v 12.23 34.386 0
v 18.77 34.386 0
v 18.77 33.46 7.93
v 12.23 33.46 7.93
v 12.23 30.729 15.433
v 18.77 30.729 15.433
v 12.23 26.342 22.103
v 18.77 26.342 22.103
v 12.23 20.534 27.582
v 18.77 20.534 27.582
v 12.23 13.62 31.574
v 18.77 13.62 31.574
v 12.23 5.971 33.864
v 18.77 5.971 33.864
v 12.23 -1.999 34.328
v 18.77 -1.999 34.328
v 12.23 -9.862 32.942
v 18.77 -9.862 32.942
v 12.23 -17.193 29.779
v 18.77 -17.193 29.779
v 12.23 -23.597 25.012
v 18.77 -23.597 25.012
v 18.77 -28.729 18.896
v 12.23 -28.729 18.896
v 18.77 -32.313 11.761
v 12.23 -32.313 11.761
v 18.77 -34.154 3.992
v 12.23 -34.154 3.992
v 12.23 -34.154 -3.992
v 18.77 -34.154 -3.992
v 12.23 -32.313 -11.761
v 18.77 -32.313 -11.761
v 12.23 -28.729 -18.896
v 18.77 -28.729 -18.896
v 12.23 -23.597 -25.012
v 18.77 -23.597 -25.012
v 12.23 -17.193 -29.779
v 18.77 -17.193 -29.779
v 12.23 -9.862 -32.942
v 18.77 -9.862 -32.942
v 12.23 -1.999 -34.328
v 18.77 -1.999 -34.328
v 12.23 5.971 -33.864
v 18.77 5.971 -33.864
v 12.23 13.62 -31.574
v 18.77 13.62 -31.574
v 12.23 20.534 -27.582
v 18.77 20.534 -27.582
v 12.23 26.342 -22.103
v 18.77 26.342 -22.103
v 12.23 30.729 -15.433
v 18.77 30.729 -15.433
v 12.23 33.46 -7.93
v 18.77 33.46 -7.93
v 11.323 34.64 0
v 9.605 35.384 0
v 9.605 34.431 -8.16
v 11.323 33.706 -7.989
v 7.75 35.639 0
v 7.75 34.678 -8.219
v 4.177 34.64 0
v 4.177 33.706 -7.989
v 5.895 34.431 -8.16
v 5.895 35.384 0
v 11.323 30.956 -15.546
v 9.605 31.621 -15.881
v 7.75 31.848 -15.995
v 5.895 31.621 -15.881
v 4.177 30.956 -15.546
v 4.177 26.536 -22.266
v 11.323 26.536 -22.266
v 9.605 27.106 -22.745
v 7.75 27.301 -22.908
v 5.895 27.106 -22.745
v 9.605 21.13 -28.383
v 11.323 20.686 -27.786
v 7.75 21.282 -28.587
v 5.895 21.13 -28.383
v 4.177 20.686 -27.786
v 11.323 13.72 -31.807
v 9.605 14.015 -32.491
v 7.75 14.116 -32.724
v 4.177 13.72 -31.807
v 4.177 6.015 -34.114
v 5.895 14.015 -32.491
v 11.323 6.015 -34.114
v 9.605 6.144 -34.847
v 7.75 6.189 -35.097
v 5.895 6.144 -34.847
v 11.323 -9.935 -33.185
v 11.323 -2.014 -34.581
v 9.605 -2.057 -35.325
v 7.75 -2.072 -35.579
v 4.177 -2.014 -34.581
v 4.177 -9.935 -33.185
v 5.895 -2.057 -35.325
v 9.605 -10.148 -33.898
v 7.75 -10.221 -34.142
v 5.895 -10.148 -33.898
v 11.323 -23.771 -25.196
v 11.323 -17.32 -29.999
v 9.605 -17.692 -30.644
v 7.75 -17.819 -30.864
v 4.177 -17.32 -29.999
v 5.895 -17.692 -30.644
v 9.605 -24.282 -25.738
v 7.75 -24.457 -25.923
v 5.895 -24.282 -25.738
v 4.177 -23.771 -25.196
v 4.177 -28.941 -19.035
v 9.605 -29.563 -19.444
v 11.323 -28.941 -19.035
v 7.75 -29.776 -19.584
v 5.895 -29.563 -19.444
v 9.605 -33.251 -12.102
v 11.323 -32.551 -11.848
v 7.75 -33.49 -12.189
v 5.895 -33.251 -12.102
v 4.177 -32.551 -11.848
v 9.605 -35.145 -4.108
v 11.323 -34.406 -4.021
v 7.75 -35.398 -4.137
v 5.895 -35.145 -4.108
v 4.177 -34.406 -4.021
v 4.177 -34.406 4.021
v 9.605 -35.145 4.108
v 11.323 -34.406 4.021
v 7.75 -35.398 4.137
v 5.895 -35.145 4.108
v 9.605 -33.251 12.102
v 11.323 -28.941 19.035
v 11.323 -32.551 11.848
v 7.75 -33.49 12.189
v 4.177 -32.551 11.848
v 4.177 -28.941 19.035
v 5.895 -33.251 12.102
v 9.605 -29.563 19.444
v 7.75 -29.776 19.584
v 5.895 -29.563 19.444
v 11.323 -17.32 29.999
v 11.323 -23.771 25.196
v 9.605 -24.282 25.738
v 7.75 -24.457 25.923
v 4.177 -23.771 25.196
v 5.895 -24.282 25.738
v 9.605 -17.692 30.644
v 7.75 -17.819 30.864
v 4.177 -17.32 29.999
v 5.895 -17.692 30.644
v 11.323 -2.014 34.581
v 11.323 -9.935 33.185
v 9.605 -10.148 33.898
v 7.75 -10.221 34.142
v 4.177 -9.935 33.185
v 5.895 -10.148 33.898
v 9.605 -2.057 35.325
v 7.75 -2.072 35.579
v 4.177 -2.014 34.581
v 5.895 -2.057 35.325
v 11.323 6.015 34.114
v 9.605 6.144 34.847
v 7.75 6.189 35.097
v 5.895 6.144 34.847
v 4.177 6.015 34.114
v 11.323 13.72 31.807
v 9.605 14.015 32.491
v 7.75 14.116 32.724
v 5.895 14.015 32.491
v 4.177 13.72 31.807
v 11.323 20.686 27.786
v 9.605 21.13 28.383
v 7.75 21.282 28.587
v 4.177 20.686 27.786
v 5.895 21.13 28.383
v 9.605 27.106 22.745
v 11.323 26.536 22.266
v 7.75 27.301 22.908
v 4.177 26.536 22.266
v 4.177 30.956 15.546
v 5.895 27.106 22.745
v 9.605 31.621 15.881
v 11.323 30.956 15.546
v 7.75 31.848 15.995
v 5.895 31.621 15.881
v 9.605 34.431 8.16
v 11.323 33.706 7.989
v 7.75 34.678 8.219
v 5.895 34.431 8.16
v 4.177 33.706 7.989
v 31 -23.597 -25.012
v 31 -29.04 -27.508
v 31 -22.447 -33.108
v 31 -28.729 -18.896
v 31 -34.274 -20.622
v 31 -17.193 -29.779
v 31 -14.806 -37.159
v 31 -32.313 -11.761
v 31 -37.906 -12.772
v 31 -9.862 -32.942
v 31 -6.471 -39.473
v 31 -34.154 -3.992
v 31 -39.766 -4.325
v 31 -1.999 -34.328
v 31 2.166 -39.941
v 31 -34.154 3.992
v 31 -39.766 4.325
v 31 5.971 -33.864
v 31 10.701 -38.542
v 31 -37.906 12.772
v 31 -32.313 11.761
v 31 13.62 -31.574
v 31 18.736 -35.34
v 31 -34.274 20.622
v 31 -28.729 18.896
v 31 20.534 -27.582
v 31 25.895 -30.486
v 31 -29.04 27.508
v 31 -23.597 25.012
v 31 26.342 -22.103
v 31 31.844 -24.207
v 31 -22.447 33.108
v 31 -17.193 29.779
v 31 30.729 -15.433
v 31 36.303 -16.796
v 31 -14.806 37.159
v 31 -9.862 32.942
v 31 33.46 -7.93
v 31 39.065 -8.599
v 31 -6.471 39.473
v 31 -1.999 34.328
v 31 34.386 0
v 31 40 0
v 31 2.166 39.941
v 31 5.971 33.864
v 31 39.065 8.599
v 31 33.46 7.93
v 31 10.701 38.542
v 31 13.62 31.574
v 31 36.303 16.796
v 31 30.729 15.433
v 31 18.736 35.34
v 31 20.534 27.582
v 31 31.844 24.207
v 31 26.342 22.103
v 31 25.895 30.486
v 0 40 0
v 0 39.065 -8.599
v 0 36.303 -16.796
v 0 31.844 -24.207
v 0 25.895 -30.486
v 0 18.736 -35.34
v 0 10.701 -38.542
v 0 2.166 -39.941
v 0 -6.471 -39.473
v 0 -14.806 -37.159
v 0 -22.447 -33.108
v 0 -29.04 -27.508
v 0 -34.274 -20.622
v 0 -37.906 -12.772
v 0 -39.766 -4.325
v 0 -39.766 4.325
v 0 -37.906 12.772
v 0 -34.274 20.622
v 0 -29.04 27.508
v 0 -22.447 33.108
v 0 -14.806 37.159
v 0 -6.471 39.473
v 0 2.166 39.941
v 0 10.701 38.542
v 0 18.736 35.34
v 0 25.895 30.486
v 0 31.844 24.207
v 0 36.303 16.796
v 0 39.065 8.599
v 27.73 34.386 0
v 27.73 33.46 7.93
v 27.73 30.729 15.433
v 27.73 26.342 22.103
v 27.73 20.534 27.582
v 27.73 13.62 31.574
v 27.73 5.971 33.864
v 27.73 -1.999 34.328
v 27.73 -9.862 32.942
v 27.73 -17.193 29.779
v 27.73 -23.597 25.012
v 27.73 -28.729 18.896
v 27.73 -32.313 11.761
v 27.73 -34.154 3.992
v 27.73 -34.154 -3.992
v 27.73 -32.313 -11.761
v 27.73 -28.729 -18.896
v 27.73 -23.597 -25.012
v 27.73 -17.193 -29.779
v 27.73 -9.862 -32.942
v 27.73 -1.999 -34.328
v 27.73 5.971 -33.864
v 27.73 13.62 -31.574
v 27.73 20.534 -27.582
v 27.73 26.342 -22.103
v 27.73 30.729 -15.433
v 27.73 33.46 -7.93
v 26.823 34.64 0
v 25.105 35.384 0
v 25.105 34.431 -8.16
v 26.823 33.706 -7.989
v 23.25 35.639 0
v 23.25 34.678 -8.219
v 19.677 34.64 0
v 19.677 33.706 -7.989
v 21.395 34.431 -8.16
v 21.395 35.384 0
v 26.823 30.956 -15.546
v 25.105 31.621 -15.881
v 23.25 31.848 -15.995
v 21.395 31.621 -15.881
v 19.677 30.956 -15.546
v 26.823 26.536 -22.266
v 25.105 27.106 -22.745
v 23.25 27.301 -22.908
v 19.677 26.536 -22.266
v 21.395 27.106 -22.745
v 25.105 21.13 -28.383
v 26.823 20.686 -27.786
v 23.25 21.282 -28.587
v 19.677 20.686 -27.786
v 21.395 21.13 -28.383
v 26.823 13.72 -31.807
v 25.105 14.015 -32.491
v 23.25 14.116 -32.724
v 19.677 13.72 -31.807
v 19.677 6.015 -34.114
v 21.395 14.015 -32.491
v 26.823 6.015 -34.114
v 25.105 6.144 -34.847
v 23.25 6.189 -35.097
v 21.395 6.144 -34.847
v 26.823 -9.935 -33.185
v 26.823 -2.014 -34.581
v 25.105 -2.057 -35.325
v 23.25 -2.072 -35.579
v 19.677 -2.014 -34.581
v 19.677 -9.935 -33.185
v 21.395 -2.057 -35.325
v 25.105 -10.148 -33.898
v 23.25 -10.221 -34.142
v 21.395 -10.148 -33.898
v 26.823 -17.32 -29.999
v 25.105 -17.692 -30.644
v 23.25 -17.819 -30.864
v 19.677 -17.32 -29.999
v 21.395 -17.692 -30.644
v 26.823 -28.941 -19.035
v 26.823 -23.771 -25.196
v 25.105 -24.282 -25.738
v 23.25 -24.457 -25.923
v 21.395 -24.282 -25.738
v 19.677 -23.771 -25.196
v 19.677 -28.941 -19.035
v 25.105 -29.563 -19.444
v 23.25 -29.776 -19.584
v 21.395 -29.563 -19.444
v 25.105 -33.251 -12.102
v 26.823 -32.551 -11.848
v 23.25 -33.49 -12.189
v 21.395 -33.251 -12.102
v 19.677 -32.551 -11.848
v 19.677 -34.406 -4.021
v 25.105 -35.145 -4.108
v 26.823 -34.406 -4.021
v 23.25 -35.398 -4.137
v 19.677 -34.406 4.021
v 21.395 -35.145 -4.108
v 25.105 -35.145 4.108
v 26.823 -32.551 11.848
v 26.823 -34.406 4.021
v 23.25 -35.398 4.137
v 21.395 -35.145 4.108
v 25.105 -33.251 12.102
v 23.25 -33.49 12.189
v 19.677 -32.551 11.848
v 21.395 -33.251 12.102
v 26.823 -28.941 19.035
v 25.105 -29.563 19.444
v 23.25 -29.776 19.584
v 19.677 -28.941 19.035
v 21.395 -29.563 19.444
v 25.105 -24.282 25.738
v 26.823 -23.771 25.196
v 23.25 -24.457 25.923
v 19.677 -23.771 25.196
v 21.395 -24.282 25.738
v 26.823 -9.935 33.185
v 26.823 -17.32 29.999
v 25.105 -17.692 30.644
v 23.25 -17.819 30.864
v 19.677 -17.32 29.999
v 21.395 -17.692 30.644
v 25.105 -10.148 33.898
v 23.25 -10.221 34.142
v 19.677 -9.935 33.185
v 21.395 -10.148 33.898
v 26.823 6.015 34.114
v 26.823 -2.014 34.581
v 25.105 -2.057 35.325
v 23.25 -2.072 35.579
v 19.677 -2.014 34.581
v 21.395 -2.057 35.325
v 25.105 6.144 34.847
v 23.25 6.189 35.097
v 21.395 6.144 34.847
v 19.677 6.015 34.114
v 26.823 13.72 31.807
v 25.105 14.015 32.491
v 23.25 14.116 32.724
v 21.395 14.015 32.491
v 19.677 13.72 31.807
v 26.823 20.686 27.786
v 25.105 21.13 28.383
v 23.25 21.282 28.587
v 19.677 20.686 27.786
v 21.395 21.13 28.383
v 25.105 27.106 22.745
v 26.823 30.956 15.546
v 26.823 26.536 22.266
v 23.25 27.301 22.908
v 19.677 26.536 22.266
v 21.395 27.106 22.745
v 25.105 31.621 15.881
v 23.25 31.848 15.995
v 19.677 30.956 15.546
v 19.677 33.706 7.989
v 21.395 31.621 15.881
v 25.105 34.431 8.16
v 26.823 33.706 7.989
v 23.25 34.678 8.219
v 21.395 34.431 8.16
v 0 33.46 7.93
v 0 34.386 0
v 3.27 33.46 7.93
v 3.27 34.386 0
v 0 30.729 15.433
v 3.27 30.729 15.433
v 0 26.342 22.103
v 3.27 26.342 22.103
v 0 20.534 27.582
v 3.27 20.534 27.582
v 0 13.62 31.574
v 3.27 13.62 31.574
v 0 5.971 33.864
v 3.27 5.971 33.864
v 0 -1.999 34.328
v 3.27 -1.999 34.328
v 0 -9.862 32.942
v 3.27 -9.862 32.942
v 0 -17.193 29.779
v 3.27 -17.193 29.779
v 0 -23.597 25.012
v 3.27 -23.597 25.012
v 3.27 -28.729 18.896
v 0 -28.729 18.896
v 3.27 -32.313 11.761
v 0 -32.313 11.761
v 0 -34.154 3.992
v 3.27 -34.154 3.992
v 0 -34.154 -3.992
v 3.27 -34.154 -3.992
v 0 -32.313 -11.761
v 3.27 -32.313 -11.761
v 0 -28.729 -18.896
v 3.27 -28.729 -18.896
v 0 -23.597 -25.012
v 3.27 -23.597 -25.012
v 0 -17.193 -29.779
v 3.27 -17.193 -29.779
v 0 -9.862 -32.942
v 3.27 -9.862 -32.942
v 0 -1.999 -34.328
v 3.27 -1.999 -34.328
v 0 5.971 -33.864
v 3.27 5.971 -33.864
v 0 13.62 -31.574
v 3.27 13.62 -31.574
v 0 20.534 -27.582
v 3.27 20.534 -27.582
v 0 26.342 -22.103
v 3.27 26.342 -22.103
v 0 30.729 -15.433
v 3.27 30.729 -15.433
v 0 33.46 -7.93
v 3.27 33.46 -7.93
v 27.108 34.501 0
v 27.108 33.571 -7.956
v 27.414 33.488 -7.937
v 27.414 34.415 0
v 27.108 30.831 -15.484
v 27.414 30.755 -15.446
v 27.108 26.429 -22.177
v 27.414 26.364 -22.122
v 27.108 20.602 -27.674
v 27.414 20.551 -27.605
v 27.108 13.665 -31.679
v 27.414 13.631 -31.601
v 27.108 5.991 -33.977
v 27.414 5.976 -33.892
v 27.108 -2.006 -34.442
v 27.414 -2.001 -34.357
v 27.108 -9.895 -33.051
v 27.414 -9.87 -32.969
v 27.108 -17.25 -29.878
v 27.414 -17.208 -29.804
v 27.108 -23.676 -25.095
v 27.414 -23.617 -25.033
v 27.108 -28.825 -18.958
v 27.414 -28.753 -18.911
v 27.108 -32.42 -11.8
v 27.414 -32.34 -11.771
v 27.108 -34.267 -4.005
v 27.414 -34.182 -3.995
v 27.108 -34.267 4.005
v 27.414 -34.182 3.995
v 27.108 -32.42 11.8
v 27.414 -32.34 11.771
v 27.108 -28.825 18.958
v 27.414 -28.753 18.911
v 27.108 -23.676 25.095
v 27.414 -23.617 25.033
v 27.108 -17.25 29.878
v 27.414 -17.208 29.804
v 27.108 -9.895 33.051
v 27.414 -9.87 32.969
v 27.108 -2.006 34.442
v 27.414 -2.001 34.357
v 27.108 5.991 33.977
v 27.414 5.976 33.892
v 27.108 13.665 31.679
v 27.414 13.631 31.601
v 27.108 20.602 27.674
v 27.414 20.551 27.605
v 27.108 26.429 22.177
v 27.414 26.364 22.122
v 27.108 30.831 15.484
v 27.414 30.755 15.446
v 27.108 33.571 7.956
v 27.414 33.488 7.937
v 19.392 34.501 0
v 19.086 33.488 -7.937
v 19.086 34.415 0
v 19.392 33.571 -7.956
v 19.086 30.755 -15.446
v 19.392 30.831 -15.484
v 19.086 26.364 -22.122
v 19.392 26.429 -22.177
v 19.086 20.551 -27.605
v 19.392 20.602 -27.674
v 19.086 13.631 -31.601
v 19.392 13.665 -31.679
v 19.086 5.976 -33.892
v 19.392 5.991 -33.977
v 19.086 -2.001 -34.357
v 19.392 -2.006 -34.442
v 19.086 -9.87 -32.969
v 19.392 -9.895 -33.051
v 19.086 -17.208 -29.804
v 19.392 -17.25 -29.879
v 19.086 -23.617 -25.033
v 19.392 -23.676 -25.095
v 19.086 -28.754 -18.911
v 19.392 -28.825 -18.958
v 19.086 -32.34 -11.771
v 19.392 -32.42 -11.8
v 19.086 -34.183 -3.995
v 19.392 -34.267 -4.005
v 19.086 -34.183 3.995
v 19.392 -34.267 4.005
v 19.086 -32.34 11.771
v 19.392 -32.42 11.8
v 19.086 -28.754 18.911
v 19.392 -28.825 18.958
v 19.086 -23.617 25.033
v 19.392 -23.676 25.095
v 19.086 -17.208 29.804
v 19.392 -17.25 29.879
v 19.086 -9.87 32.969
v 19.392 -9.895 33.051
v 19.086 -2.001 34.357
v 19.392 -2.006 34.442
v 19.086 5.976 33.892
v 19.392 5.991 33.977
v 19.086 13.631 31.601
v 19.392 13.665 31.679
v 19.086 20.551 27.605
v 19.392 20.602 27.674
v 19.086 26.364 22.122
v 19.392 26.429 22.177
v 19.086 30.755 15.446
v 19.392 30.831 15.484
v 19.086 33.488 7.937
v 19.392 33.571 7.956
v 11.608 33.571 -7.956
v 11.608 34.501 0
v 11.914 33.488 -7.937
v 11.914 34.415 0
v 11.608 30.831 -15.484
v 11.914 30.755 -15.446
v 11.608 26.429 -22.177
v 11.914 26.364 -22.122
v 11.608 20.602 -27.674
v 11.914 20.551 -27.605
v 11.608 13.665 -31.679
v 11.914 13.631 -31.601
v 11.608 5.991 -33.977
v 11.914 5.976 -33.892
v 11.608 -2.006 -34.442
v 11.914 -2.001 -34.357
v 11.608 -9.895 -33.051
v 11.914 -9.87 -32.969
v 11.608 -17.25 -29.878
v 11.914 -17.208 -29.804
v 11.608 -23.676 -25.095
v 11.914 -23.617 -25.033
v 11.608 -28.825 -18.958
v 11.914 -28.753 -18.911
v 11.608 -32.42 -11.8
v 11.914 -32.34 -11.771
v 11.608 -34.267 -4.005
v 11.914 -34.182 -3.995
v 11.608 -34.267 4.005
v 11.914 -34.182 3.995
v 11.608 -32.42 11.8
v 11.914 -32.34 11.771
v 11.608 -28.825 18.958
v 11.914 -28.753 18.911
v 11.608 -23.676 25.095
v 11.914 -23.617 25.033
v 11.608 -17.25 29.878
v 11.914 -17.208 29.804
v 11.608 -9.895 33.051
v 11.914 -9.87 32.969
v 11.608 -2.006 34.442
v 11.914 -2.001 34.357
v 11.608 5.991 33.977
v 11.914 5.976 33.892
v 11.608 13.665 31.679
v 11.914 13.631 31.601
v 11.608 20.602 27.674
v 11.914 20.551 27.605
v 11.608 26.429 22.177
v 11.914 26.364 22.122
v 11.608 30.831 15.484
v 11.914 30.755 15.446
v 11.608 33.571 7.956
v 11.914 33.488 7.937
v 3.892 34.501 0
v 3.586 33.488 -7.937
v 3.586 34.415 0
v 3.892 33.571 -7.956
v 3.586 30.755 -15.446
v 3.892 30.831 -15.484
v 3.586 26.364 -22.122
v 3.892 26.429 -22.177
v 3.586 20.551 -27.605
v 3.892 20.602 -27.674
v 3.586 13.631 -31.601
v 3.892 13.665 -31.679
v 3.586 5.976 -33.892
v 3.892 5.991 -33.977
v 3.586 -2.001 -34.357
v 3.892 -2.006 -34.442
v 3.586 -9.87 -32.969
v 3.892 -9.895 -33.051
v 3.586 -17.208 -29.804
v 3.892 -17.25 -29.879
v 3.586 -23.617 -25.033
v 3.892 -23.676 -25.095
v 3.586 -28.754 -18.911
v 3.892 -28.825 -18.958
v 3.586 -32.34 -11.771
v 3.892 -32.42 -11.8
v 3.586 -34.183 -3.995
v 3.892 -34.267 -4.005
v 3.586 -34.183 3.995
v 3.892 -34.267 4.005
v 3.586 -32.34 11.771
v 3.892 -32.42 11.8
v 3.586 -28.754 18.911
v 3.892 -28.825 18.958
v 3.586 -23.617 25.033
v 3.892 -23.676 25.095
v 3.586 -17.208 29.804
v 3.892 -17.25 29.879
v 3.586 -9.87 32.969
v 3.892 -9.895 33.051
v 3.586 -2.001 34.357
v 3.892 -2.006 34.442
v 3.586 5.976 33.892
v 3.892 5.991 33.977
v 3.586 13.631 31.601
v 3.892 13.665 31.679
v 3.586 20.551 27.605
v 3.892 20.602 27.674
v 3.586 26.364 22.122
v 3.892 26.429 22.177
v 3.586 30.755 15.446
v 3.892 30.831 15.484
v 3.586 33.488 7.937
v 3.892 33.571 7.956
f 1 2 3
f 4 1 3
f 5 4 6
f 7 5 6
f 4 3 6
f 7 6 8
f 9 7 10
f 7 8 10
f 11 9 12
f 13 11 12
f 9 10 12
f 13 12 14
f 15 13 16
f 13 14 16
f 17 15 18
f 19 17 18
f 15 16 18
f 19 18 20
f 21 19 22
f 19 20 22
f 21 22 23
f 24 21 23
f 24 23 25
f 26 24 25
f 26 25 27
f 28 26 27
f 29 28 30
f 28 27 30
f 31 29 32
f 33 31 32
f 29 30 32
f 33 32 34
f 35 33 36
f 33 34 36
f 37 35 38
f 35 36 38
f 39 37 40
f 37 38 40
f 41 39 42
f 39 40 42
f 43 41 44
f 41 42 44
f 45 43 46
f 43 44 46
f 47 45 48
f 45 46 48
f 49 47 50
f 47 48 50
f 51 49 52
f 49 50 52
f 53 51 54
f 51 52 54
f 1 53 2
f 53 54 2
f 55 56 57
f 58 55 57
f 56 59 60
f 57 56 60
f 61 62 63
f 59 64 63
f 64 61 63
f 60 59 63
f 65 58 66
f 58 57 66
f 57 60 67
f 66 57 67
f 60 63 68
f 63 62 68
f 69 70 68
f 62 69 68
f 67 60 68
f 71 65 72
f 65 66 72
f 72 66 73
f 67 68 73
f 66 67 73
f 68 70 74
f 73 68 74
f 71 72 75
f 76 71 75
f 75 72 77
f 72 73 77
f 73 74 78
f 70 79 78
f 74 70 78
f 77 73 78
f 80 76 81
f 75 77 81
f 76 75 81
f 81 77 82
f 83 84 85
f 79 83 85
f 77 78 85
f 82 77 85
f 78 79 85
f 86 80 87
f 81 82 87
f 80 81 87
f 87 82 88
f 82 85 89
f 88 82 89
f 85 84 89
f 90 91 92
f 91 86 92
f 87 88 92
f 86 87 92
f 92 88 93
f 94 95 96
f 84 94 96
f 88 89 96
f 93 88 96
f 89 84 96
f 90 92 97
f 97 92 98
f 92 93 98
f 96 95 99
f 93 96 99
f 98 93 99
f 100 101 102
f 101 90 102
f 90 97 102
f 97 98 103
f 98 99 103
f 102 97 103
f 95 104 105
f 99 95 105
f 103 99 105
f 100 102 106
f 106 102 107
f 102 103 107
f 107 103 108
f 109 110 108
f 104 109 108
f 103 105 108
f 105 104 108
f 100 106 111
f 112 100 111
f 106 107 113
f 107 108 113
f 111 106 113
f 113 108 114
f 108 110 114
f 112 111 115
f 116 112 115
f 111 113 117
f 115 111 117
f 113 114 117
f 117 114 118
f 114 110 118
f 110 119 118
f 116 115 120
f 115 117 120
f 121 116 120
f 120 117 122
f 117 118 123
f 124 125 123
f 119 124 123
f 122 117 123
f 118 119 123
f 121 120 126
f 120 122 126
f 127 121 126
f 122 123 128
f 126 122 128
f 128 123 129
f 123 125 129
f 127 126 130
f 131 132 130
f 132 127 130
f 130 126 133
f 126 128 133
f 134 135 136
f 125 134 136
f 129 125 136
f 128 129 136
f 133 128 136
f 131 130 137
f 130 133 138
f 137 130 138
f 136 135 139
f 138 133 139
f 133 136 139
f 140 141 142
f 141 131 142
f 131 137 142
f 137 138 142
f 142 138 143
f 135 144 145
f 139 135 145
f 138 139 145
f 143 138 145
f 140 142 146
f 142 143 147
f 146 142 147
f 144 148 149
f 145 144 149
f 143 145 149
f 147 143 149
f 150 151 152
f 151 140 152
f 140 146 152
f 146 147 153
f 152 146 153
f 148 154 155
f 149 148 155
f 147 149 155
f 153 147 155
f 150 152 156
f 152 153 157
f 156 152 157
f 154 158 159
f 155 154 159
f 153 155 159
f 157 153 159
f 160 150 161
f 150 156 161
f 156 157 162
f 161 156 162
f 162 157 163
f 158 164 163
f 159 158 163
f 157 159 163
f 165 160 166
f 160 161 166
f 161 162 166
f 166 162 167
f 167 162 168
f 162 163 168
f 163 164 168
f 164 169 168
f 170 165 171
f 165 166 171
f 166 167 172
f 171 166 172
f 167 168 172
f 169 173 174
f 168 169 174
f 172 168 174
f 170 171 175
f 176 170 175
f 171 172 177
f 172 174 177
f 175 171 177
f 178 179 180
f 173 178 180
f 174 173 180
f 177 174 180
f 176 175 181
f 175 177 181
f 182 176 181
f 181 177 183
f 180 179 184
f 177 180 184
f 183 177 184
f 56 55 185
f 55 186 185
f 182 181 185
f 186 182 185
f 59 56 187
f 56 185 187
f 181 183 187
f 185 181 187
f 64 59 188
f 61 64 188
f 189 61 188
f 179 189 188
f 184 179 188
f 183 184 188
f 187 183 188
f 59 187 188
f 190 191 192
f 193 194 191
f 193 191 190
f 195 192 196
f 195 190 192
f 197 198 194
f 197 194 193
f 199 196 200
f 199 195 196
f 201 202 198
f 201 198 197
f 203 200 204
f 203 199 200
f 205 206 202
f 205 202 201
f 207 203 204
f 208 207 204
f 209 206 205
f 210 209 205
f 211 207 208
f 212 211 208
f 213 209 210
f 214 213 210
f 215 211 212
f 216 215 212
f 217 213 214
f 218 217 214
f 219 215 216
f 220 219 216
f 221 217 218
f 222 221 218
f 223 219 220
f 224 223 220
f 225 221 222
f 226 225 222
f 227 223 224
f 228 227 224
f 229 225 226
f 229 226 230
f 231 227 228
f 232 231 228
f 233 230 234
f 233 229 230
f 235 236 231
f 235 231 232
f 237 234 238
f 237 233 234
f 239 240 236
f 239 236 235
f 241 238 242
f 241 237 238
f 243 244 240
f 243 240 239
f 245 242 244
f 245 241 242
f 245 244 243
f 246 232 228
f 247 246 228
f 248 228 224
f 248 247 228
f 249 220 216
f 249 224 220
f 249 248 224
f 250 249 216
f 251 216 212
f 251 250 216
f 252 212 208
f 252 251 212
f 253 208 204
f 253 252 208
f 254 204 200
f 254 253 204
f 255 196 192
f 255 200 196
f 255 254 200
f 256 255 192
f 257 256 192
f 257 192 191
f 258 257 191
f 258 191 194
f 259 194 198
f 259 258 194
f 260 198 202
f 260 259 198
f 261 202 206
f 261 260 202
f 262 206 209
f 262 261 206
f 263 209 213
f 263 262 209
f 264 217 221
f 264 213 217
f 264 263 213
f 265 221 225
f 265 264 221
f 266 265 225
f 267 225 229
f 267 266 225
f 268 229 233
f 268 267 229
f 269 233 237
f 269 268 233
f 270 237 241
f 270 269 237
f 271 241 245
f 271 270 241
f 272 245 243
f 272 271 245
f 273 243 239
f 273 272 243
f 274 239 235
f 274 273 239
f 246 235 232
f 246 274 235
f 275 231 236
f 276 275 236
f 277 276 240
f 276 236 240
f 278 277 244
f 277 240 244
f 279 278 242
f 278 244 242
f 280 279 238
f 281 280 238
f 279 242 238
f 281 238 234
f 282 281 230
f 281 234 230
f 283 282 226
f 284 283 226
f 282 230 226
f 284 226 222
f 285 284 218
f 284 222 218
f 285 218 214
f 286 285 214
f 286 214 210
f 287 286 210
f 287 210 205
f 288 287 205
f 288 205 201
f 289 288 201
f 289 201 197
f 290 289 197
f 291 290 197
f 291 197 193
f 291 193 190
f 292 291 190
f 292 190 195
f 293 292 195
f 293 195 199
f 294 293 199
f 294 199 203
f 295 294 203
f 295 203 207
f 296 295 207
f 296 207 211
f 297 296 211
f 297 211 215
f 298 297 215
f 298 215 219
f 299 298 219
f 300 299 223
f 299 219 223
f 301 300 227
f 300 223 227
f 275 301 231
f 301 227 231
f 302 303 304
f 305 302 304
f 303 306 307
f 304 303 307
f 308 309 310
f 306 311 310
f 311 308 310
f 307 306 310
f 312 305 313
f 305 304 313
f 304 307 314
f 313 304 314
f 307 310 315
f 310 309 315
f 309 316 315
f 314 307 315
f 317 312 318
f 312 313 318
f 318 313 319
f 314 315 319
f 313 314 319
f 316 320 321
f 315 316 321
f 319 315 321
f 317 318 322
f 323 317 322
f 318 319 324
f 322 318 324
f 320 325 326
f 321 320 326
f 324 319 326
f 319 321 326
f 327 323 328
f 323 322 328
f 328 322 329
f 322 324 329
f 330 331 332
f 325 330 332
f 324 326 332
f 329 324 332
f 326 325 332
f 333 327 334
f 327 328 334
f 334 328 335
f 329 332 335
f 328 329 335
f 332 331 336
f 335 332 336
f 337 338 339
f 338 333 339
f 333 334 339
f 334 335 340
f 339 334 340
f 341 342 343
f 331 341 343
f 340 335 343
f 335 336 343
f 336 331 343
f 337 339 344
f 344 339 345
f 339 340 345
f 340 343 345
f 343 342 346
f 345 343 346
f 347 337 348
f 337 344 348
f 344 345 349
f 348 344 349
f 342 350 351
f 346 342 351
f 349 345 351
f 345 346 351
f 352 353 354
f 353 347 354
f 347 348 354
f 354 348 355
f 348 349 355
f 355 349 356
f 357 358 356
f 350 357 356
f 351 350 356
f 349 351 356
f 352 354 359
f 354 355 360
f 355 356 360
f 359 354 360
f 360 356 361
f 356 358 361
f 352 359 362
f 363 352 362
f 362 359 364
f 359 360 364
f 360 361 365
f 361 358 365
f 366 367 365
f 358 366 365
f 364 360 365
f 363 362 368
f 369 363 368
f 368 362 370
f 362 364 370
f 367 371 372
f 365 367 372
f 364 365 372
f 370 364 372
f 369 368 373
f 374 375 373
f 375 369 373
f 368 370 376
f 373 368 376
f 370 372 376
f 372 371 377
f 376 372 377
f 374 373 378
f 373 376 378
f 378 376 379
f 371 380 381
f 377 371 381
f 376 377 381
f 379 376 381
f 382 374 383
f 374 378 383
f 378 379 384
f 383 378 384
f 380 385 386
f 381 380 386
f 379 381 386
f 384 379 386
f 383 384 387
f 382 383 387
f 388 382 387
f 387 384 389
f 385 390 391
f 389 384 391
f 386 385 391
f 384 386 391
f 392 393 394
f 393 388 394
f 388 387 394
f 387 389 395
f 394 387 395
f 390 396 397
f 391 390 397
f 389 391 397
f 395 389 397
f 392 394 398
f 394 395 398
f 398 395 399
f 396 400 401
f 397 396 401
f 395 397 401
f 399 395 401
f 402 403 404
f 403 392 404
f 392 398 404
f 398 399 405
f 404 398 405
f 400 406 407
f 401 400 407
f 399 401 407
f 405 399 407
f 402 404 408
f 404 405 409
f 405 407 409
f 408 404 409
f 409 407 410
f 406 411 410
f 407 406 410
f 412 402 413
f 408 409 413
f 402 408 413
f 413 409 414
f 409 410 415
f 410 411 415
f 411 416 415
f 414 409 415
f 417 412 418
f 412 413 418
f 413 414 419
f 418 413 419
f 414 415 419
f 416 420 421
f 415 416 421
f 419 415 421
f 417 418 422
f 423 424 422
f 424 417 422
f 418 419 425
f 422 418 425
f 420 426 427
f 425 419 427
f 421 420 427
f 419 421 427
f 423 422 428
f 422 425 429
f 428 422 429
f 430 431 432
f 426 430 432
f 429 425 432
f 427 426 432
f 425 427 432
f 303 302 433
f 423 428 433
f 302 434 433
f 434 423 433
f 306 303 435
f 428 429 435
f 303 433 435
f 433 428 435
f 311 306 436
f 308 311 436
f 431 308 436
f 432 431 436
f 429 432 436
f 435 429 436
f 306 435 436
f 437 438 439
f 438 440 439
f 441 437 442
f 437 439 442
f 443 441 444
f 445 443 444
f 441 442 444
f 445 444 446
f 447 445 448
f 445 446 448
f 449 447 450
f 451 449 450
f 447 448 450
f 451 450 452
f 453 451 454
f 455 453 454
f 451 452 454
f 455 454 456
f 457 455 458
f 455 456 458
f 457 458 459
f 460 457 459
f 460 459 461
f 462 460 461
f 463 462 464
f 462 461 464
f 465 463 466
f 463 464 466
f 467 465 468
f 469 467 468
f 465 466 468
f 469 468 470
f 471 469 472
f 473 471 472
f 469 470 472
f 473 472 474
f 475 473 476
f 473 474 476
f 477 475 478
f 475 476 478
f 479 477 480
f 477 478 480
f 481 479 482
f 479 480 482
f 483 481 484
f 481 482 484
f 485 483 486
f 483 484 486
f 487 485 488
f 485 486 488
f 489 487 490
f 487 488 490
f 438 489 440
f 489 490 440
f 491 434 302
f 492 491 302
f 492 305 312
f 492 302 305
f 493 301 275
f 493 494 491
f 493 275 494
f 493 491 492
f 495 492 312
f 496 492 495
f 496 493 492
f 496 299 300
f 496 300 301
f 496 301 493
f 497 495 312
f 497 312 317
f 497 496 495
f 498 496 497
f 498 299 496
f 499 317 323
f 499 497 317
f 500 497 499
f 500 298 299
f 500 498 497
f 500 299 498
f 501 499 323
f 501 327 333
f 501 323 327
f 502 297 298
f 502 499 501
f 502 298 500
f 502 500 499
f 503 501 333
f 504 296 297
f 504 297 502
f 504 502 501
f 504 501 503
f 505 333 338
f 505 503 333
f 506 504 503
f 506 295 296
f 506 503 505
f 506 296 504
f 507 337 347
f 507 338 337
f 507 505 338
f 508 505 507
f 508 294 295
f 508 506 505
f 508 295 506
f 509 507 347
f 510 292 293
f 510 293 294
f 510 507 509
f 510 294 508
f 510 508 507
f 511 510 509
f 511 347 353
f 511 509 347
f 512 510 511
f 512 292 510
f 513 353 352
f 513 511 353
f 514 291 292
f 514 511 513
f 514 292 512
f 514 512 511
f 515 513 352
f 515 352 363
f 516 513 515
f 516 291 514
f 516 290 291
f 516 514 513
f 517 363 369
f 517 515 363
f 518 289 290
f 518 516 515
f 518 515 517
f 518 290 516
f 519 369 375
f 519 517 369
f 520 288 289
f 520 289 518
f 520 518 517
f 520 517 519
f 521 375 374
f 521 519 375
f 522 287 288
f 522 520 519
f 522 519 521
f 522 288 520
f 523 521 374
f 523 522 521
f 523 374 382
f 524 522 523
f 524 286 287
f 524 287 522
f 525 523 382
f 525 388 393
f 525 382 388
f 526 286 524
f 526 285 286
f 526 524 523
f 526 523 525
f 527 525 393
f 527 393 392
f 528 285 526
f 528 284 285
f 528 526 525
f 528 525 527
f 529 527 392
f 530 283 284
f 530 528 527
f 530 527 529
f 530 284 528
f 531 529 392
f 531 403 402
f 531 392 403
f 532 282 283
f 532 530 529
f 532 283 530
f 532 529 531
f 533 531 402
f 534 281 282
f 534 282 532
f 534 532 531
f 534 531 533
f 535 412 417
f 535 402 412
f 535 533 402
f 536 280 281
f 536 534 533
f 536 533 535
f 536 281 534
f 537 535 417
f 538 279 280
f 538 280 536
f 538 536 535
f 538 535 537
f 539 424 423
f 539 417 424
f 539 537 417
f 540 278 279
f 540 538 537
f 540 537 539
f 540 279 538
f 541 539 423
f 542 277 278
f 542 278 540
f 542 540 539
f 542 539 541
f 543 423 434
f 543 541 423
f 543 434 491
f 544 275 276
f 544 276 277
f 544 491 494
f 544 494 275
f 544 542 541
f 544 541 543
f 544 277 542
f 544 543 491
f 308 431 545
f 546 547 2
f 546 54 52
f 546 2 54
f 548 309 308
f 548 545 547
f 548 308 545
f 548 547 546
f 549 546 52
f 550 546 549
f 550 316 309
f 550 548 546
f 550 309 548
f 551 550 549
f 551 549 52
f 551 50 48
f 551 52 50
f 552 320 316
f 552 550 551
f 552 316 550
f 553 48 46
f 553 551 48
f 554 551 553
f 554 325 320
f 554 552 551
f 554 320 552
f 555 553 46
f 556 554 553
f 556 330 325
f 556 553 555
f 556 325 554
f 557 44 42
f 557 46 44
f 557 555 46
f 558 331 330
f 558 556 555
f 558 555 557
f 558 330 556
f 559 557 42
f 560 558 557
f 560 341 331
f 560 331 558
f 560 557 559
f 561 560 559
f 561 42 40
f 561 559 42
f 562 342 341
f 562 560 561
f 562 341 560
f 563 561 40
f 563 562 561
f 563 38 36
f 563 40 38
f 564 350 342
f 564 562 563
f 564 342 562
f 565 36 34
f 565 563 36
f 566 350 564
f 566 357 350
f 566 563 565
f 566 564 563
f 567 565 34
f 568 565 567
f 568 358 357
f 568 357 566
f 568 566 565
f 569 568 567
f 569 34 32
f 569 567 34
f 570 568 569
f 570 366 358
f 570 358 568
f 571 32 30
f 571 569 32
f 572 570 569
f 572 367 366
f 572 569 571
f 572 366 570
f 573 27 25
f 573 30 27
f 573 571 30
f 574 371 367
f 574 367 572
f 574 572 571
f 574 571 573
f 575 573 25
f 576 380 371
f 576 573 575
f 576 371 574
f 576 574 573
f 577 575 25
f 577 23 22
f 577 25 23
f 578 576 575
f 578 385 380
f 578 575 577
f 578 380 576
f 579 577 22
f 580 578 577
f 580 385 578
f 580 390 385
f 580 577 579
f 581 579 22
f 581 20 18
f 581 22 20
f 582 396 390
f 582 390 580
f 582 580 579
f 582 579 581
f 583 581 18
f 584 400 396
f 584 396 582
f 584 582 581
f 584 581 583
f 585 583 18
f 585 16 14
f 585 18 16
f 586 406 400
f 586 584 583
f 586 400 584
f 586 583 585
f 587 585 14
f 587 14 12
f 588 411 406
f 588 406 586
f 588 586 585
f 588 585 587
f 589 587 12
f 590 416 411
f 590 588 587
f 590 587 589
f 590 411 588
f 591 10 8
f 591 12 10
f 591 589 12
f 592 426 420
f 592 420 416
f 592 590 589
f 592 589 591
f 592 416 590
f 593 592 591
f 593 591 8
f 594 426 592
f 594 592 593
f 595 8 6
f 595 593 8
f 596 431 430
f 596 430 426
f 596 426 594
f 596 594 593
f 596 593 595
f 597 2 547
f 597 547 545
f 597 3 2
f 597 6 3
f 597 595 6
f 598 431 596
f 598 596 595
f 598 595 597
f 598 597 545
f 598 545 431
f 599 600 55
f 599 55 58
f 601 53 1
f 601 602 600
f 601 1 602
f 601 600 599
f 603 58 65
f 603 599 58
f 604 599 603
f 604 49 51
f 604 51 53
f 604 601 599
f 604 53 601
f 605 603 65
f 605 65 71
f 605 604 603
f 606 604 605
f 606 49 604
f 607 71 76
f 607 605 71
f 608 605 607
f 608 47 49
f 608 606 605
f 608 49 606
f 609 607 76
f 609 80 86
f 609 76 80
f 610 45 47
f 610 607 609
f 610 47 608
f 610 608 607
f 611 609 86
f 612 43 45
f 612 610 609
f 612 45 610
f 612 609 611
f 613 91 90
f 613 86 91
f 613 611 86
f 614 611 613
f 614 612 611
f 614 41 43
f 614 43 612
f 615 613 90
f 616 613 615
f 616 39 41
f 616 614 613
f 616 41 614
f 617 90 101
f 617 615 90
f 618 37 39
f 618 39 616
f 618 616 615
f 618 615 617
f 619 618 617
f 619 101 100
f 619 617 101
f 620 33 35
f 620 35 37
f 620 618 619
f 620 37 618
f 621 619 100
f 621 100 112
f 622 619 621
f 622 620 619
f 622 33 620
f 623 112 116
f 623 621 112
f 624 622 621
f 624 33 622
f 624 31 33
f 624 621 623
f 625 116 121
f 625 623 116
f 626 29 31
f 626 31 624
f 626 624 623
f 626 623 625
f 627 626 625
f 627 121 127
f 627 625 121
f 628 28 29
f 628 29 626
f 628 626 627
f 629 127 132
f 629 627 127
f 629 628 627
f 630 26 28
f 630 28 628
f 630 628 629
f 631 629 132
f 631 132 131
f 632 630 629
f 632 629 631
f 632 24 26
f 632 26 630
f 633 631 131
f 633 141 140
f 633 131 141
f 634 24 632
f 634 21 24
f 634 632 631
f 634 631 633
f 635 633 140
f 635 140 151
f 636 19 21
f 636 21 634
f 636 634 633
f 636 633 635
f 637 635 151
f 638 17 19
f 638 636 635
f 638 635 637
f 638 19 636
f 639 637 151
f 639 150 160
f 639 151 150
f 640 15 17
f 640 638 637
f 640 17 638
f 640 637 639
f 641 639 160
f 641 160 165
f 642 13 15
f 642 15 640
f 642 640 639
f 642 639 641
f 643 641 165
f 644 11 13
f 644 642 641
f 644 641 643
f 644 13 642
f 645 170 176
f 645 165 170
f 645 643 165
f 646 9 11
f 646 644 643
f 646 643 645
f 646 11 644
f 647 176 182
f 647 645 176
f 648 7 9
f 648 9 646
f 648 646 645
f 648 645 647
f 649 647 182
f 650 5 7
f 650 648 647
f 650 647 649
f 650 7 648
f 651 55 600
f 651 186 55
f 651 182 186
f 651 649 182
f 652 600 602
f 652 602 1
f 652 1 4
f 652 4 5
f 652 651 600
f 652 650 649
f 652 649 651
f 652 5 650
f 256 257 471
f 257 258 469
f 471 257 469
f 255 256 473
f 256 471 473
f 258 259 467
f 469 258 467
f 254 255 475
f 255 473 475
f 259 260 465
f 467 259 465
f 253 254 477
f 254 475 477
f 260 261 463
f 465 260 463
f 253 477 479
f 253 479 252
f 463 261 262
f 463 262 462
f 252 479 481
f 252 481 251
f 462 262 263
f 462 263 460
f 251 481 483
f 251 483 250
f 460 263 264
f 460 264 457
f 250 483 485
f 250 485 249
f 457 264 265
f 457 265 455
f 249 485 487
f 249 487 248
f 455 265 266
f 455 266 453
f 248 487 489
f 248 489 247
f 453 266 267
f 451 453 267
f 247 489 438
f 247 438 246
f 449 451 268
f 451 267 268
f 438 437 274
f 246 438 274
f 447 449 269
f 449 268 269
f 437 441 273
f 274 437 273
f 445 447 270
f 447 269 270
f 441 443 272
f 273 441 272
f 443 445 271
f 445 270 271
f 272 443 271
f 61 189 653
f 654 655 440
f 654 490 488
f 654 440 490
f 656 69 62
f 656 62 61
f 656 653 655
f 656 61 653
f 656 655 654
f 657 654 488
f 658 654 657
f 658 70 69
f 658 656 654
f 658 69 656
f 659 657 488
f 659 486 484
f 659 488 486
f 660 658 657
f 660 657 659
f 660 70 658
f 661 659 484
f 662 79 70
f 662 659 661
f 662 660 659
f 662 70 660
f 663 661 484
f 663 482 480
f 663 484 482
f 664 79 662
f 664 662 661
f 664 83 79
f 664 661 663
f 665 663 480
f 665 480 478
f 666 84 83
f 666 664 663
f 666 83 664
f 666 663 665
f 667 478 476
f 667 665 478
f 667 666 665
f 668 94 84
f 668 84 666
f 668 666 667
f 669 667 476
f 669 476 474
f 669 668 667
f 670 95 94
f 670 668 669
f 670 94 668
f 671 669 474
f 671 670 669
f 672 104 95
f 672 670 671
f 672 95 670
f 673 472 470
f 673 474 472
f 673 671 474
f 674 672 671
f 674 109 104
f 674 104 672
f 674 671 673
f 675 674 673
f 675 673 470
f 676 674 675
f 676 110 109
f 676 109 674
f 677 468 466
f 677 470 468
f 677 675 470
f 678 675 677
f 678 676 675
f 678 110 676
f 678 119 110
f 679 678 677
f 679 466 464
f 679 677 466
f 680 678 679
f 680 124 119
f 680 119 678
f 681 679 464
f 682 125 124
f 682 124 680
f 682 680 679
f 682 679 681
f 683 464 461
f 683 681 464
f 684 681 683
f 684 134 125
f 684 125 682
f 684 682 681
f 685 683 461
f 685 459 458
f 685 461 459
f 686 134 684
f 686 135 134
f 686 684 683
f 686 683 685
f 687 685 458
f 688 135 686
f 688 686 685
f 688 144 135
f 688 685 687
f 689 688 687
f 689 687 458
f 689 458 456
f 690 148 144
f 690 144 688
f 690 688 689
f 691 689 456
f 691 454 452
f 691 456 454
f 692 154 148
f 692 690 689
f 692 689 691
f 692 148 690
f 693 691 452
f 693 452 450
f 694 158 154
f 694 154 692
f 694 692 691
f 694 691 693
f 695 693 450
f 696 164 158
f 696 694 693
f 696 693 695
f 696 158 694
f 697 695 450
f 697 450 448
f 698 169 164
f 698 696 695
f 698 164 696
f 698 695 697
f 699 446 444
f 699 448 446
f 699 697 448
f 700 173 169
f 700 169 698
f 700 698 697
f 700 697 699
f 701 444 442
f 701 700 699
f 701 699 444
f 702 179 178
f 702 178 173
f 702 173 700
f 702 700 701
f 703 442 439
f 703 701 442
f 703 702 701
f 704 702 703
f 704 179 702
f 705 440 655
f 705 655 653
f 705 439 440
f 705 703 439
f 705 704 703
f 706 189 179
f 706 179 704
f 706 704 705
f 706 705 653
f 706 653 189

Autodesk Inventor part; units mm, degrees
sketch "Sketch_1" plane through (0, 0, 0) normal (0, 0, 1) x (1, 0, 0)
  line L0 (50, 0) -> (-50, 0)
  line L1 (0, 34.3864) -> (3.2698, 34.3864)
  arc A0 (3.2698, 34.3864) -> (4.1774, 34.6401) centre (3.2698, 36.1364) ccw
  arc A1 (11.3226, 34.6401) -> (4.1774, 34.6401) centre (7.75, 28.75) ccw
  arc A2 (11.3226, 34.6401) -> (12.2302, 34.3864) centre (12.2302, 36.1364) ccw
  line L2 (12.2302, 34.3864) -> (18.7698, 34.3864)
  arc A3 (18.7698, 34.3864) -> (19.6774, 34.6401) centre (18.7698, 36.1364) ccw
  arc A4 (26.8226, 34.6401) -> (19.6774, 34.6401) centre (23.25, 28.75) ccw
  arc A5 (26.8226, 34.6401) -> (27.7302, 34.3864) centre (27.7302, 36.1364) ccw
  line L3 (27.7302, 34.3864) -> (31, 34.3864)
  line L4 (31, 34.3864) -> (31, 40)
  line L5 (31, 40) -> (0, 40)
  line L6 (0, 40) -> (0, 34.3864)
revolve "Revolution1" add sketch "Sketch_1" angle 360 about axis through (50, 0, 0) along (1, 0, 0)
ref_plane "IP_1_XY" through (0, 0, 0) normal (1, 0, 0) x (0, 0, -1)
ref_plane "IP_1_YZ" through (0, 0, 0) normal (0, 0, -1) x (0, 1, 0)
ref_plane "IP_1_ZX" through (0, 0, 0) normal (0, 1, 0) x (1, 0, 0)
ref_plane "IP_2_XY" through (15.5, 0, 0) normal (1, 0, 0) x (0, 0, -1)
ref_plane "IP_2_YZ" through (15.5, 0, 0) normal (0, 0, -1) x (0, 1, 0)
ref_plane "IP_2_ZX" through (15.5, 0, 0) normal (0, 1, 0) x (1, 0, 0)
properties part number "hpc_Q2307-ACC_1"
